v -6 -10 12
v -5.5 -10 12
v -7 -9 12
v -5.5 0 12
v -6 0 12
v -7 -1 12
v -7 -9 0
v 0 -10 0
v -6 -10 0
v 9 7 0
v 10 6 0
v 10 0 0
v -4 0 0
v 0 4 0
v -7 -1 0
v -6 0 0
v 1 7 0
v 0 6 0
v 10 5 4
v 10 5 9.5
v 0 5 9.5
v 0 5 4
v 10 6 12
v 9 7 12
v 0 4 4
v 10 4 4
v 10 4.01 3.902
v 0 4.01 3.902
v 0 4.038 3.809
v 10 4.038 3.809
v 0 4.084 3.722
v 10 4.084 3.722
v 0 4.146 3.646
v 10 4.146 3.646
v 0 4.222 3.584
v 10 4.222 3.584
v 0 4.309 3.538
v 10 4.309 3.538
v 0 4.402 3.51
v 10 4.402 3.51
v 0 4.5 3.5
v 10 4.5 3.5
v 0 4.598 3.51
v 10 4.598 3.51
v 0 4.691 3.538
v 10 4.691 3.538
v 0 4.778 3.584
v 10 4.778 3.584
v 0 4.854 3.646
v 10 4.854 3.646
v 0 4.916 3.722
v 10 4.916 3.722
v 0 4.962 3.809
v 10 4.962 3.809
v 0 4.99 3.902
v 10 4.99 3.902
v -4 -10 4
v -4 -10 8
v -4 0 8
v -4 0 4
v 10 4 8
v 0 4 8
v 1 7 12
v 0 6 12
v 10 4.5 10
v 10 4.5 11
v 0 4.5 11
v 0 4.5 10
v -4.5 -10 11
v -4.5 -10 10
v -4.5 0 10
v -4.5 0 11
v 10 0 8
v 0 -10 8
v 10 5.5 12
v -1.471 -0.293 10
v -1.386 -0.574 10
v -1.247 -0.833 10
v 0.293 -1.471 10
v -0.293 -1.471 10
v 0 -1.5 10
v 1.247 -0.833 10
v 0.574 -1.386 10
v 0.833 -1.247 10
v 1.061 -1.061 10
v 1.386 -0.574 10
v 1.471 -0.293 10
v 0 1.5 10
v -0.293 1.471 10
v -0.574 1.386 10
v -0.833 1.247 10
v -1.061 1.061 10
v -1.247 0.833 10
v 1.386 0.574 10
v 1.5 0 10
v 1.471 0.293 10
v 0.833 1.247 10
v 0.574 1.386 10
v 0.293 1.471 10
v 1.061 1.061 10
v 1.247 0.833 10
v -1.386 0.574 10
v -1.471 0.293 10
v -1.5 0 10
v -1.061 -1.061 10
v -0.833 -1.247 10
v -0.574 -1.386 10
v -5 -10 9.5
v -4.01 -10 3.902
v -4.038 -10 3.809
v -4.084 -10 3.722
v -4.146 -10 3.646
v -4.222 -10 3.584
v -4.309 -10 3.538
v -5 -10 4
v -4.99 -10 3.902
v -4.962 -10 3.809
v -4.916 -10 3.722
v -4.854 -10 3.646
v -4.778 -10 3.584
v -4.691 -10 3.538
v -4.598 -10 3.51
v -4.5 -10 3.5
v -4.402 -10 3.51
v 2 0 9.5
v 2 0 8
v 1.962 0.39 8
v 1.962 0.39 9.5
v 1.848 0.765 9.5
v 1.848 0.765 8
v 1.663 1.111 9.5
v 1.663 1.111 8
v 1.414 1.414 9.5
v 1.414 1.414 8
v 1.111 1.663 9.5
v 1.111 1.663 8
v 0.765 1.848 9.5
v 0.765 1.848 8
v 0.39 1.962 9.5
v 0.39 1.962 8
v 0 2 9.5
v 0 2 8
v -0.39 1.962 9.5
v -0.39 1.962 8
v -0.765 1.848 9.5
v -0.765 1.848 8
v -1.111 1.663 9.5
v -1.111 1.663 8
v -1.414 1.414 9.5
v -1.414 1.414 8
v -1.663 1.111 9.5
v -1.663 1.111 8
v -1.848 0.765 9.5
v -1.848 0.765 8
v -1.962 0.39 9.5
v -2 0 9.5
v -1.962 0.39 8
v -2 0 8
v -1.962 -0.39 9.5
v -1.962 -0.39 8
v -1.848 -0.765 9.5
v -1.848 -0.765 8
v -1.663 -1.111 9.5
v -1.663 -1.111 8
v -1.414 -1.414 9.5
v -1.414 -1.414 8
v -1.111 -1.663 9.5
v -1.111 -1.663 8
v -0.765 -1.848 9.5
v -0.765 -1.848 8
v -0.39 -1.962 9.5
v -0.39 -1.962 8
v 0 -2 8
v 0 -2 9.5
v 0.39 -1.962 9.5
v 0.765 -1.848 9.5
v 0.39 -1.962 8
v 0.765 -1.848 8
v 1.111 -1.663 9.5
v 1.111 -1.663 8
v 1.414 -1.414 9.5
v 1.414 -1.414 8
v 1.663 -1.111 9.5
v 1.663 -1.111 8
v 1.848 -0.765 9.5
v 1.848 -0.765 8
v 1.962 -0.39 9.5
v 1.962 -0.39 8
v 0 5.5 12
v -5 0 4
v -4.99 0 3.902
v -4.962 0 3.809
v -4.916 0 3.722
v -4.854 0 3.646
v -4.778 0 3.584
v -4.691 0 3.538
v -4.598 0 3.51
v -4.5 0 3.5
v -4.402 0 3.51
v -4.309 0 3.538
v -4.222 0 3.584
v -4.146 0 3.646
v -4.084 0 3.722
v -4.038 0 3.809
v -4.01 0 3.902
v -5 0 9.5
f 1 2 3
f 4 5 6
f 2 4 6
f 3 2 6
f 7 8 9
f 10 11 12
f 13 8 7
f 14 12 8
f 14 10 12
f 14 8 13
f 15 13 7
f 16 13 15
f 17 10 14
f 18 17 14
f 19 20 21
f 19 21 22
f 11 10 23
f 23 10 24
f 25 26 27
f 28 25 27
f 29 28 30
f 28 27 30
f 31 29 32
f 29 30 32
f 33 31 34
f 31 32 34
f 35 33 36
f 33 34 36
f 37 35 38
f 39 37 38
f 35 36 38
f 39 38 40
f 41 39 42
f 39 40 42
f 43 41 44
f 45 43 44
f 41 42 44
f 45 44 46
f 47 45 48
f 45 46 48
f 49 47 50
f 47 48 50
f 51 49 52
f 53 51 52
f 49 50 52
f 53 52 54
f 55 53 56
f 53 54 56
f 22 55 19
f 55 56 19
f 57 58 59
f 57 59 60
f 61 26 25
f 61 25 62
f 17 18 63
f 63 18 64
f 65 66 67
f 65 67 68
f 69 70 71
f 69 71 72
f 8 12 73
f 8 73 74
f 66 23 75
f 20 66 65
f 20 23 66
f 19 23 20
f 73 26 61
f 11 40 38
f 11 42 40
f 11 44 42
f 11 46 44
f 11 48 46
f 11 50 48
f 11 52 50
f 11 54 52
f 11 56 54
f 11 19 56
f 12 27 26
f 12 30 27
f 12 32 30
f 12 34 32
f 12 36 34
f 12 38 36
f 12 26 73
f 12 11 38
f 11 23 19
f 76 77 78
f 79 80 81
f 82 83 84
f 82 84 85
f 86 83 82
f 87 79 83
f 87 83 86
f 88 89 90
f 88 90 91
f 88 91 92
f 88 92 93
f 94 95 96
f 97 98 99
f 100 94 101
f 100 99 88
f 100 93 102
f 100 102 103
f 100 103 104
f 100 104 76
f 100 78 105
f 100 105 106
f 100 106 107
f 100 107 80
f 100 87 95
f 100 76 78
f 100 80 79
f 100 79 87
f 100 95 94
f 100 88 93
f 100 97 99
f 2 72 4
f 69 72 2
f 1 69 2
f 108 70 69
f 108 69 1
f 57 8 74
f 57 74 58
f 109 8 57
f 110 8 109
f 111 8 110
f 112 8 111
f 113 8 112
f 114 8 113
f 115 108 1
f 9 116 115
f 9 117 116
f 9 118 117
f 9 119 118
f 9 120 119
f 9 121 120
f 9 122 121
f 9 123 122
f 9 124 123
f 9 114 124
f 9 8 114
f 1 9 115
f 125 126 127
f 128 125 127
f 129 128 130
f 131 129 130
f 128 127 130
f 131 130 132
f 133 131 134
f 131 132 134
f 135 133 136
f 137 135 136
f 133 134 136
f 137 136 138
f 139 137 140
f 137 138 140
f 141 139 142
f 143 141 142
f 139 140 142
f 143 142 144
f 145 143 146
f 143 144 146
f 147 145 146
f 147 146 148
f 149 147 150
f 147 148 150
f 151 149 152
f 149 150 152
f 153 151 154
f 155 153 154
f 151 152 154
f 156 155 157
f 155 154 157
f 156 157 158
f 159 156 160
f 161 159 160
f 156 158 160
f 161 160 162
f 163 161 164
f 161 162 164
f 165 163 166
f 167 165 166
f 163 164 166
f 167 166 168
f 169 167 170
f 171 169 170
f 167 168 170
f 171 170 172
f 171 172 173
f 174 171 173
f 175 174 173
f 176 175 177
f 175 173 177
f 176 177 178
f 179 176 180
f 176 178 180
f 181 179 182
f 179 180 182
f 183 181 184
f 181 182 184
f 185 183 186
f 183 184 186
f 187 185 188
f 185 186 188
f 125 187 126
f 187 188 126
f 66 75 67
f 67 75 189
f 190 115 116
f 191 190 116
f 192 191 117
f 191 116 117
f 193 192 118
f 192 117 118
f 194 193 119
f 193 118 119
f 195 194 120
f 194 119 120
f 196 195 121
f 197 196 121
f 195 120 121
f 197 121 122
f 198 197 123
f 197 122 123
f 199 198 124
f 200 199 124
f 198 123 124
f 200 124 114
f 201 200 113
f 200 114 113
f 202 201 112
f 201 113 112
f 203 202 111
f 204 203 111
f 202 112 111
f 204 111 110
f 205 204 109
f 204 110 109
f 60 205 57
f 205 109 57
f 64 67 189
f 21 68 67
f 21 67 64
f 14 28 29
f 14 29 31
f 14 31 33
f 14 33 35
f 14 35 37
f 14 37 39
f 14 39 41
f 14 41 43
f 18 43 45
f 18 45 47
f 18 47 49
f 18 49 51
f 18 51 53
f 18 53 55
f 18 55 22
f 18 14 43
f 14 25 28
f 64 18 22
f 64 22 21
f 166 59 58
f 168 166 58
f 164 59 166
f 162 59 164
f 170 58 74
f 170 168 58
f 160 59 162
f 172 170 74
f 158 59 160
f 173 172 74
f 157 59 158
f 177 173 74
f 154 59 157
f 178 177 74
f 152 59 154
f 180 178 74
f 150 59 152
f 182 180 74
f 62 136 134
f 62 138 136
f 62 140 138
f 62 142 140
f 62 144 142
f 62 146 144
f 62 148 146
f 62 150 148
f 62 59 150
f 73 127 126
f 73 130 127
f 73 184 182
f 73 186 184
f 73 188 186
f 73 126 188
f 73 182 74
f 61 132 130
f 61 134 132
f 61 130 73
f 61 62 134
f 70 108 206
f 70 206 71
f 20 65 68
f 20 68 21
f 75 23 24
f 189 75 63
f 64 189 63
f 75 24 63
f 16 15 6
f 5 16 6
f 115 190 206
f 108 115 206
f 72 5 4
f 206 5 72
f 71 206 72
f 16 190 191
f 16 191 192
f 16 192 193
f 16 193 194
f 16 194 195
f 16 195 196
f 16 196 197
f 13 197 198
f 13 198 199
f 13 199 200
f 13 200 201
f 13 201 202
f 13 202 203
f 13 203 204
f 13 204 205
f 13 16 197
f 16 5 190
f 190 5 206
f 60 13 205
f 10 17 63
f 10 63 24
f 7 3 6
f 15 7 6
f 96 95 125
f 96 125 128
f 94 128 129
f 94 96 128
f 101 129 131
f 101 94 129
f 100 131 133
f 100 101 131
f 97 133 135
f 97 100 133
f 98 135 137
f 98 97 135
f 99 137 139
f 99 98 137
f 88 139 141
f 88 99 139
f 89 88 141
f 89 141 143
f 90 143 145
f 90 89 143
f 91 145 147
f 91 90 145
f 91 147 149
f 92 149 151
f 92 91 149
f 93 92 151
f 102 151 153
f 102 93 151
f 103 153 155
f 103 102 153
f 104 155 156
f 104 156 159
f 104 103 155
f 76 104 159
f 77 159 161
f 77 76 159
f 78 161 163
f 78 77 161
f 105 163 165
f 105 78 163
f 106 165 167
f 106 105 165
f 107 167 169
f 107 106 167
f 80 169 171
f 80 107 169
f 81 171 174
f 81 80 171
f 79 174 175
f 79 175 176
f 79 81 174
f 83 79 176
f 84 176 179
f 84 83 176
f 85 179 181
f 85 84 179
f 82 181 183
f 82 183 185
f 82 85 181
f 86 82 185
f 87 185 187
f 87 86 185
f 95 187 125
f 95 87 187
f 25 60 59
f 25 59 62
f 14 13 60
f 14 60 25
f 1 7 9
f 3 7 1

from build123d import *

# Parameters (mm, degrees)
PAD_DEPTH       = 12
POCKET_DEPTH    = 10.1
POCKET001_DEPTH = 10.1
SKETCH003_W     = 15.841853
SKETCH003_H     = 14.91592
POCKET002_DEPTH = 4
SKETCH004_R     = 2
PAD001_DEPTH    = 2
CHAMFER_SIZE    = 0.5
CHAMFER001_SIZE = 1


with BuildPart() as part:
    # Sketch → Pad (new body)
    with BuildSketch(Plane.XY):
        Polygon((0, 7), (10, 7), (10, 0), (0, -10), (-7, -10), (-7, 0), (-4, 0), (0, 4), align=None)
    extrude(amount=PAD_DEPTH)

    # Sketch001 (on Face4 of Pad) → Pocket (cut)
    with BuildSketch(Plane.XZ.offset(10)):
        with BuildLine():
            Line((-4.5, 10), (-4.5, 13.32))
            Line((-4.5, 13.32), (-4, 13.32))
            Line((-4, 13.32), (-4, 4))
            ThreePointArc((-5, 4), (-4.5, 3.5), (-4, 4))
            Line((-5, 4), (-5, 9.5))
            Line((-5, 9.5), (-4.5, 10))
        make_face()
    extrude(amount=-POCKET_DEPTH, mode=Mode.SUBTRACT)

    # Sketch002 (on Face3 of Pocket) → Pocket001 (cut)
    with BuildSketch(Plane.YZ.offset(10)):
        with BuildLine():
            Line((4.5, 12.95), (4.5, 10))
            Line((4.5, 10), (5, 9.5))
            Line((5, 9.5), (5, 4))
            ThreePointArc((4, 4), (4.5, 3.5), (5, 4))
            Line((4, 4), (4, 12.95))
            Line((4, 12.95), (4.5, 12.95))
        make_face()
    extrude(amount=-POCKET001_DEPTH, mode=Mode.SUBTRACT)

    # Sketch003 (on Face5 of Pocket001) → Pocket002 (cut)
    with BuildSketch(Plane.XY.offset(12)):
        with Locations((3.700034, -3.226885)):
            Rectangle(SKETCH003_W, SKETCH003_H)
    extrude(amount=-POCKET002_DEPTH, mode=Mode.SUBTRACT)

    # Sketch004 (on Face12 of Pocket002) → Pad001 (join)
    with BuildSketch(Plane.XY.offset(8)):
        Circle(SKETCH004_R)
    extrude(amount=PAD001_DEPTH)

    # Chamfer
    chamfer_edges = [part.edges().sort_by_distance(p)[0] for p in [
        (-2, 0, 10),
    ]]
    chamfer(chamfer_edges, length=CHAMFER_SIZE)

    # Chamfer001
    chamfer001_edges = [part.edges().sort_by_distance(p)[0] for p in [
        (-7, -10, 6),
        (-7, 0, 6),
        (0, 7, 6),
        (10, 7, 6),
        (5, 4.5, 12),
        (-4.5, -5, 12),
    ]]
    chamfer(chamfer001_edges, length=CHAMFER001_SIZE)


solid = part.part
